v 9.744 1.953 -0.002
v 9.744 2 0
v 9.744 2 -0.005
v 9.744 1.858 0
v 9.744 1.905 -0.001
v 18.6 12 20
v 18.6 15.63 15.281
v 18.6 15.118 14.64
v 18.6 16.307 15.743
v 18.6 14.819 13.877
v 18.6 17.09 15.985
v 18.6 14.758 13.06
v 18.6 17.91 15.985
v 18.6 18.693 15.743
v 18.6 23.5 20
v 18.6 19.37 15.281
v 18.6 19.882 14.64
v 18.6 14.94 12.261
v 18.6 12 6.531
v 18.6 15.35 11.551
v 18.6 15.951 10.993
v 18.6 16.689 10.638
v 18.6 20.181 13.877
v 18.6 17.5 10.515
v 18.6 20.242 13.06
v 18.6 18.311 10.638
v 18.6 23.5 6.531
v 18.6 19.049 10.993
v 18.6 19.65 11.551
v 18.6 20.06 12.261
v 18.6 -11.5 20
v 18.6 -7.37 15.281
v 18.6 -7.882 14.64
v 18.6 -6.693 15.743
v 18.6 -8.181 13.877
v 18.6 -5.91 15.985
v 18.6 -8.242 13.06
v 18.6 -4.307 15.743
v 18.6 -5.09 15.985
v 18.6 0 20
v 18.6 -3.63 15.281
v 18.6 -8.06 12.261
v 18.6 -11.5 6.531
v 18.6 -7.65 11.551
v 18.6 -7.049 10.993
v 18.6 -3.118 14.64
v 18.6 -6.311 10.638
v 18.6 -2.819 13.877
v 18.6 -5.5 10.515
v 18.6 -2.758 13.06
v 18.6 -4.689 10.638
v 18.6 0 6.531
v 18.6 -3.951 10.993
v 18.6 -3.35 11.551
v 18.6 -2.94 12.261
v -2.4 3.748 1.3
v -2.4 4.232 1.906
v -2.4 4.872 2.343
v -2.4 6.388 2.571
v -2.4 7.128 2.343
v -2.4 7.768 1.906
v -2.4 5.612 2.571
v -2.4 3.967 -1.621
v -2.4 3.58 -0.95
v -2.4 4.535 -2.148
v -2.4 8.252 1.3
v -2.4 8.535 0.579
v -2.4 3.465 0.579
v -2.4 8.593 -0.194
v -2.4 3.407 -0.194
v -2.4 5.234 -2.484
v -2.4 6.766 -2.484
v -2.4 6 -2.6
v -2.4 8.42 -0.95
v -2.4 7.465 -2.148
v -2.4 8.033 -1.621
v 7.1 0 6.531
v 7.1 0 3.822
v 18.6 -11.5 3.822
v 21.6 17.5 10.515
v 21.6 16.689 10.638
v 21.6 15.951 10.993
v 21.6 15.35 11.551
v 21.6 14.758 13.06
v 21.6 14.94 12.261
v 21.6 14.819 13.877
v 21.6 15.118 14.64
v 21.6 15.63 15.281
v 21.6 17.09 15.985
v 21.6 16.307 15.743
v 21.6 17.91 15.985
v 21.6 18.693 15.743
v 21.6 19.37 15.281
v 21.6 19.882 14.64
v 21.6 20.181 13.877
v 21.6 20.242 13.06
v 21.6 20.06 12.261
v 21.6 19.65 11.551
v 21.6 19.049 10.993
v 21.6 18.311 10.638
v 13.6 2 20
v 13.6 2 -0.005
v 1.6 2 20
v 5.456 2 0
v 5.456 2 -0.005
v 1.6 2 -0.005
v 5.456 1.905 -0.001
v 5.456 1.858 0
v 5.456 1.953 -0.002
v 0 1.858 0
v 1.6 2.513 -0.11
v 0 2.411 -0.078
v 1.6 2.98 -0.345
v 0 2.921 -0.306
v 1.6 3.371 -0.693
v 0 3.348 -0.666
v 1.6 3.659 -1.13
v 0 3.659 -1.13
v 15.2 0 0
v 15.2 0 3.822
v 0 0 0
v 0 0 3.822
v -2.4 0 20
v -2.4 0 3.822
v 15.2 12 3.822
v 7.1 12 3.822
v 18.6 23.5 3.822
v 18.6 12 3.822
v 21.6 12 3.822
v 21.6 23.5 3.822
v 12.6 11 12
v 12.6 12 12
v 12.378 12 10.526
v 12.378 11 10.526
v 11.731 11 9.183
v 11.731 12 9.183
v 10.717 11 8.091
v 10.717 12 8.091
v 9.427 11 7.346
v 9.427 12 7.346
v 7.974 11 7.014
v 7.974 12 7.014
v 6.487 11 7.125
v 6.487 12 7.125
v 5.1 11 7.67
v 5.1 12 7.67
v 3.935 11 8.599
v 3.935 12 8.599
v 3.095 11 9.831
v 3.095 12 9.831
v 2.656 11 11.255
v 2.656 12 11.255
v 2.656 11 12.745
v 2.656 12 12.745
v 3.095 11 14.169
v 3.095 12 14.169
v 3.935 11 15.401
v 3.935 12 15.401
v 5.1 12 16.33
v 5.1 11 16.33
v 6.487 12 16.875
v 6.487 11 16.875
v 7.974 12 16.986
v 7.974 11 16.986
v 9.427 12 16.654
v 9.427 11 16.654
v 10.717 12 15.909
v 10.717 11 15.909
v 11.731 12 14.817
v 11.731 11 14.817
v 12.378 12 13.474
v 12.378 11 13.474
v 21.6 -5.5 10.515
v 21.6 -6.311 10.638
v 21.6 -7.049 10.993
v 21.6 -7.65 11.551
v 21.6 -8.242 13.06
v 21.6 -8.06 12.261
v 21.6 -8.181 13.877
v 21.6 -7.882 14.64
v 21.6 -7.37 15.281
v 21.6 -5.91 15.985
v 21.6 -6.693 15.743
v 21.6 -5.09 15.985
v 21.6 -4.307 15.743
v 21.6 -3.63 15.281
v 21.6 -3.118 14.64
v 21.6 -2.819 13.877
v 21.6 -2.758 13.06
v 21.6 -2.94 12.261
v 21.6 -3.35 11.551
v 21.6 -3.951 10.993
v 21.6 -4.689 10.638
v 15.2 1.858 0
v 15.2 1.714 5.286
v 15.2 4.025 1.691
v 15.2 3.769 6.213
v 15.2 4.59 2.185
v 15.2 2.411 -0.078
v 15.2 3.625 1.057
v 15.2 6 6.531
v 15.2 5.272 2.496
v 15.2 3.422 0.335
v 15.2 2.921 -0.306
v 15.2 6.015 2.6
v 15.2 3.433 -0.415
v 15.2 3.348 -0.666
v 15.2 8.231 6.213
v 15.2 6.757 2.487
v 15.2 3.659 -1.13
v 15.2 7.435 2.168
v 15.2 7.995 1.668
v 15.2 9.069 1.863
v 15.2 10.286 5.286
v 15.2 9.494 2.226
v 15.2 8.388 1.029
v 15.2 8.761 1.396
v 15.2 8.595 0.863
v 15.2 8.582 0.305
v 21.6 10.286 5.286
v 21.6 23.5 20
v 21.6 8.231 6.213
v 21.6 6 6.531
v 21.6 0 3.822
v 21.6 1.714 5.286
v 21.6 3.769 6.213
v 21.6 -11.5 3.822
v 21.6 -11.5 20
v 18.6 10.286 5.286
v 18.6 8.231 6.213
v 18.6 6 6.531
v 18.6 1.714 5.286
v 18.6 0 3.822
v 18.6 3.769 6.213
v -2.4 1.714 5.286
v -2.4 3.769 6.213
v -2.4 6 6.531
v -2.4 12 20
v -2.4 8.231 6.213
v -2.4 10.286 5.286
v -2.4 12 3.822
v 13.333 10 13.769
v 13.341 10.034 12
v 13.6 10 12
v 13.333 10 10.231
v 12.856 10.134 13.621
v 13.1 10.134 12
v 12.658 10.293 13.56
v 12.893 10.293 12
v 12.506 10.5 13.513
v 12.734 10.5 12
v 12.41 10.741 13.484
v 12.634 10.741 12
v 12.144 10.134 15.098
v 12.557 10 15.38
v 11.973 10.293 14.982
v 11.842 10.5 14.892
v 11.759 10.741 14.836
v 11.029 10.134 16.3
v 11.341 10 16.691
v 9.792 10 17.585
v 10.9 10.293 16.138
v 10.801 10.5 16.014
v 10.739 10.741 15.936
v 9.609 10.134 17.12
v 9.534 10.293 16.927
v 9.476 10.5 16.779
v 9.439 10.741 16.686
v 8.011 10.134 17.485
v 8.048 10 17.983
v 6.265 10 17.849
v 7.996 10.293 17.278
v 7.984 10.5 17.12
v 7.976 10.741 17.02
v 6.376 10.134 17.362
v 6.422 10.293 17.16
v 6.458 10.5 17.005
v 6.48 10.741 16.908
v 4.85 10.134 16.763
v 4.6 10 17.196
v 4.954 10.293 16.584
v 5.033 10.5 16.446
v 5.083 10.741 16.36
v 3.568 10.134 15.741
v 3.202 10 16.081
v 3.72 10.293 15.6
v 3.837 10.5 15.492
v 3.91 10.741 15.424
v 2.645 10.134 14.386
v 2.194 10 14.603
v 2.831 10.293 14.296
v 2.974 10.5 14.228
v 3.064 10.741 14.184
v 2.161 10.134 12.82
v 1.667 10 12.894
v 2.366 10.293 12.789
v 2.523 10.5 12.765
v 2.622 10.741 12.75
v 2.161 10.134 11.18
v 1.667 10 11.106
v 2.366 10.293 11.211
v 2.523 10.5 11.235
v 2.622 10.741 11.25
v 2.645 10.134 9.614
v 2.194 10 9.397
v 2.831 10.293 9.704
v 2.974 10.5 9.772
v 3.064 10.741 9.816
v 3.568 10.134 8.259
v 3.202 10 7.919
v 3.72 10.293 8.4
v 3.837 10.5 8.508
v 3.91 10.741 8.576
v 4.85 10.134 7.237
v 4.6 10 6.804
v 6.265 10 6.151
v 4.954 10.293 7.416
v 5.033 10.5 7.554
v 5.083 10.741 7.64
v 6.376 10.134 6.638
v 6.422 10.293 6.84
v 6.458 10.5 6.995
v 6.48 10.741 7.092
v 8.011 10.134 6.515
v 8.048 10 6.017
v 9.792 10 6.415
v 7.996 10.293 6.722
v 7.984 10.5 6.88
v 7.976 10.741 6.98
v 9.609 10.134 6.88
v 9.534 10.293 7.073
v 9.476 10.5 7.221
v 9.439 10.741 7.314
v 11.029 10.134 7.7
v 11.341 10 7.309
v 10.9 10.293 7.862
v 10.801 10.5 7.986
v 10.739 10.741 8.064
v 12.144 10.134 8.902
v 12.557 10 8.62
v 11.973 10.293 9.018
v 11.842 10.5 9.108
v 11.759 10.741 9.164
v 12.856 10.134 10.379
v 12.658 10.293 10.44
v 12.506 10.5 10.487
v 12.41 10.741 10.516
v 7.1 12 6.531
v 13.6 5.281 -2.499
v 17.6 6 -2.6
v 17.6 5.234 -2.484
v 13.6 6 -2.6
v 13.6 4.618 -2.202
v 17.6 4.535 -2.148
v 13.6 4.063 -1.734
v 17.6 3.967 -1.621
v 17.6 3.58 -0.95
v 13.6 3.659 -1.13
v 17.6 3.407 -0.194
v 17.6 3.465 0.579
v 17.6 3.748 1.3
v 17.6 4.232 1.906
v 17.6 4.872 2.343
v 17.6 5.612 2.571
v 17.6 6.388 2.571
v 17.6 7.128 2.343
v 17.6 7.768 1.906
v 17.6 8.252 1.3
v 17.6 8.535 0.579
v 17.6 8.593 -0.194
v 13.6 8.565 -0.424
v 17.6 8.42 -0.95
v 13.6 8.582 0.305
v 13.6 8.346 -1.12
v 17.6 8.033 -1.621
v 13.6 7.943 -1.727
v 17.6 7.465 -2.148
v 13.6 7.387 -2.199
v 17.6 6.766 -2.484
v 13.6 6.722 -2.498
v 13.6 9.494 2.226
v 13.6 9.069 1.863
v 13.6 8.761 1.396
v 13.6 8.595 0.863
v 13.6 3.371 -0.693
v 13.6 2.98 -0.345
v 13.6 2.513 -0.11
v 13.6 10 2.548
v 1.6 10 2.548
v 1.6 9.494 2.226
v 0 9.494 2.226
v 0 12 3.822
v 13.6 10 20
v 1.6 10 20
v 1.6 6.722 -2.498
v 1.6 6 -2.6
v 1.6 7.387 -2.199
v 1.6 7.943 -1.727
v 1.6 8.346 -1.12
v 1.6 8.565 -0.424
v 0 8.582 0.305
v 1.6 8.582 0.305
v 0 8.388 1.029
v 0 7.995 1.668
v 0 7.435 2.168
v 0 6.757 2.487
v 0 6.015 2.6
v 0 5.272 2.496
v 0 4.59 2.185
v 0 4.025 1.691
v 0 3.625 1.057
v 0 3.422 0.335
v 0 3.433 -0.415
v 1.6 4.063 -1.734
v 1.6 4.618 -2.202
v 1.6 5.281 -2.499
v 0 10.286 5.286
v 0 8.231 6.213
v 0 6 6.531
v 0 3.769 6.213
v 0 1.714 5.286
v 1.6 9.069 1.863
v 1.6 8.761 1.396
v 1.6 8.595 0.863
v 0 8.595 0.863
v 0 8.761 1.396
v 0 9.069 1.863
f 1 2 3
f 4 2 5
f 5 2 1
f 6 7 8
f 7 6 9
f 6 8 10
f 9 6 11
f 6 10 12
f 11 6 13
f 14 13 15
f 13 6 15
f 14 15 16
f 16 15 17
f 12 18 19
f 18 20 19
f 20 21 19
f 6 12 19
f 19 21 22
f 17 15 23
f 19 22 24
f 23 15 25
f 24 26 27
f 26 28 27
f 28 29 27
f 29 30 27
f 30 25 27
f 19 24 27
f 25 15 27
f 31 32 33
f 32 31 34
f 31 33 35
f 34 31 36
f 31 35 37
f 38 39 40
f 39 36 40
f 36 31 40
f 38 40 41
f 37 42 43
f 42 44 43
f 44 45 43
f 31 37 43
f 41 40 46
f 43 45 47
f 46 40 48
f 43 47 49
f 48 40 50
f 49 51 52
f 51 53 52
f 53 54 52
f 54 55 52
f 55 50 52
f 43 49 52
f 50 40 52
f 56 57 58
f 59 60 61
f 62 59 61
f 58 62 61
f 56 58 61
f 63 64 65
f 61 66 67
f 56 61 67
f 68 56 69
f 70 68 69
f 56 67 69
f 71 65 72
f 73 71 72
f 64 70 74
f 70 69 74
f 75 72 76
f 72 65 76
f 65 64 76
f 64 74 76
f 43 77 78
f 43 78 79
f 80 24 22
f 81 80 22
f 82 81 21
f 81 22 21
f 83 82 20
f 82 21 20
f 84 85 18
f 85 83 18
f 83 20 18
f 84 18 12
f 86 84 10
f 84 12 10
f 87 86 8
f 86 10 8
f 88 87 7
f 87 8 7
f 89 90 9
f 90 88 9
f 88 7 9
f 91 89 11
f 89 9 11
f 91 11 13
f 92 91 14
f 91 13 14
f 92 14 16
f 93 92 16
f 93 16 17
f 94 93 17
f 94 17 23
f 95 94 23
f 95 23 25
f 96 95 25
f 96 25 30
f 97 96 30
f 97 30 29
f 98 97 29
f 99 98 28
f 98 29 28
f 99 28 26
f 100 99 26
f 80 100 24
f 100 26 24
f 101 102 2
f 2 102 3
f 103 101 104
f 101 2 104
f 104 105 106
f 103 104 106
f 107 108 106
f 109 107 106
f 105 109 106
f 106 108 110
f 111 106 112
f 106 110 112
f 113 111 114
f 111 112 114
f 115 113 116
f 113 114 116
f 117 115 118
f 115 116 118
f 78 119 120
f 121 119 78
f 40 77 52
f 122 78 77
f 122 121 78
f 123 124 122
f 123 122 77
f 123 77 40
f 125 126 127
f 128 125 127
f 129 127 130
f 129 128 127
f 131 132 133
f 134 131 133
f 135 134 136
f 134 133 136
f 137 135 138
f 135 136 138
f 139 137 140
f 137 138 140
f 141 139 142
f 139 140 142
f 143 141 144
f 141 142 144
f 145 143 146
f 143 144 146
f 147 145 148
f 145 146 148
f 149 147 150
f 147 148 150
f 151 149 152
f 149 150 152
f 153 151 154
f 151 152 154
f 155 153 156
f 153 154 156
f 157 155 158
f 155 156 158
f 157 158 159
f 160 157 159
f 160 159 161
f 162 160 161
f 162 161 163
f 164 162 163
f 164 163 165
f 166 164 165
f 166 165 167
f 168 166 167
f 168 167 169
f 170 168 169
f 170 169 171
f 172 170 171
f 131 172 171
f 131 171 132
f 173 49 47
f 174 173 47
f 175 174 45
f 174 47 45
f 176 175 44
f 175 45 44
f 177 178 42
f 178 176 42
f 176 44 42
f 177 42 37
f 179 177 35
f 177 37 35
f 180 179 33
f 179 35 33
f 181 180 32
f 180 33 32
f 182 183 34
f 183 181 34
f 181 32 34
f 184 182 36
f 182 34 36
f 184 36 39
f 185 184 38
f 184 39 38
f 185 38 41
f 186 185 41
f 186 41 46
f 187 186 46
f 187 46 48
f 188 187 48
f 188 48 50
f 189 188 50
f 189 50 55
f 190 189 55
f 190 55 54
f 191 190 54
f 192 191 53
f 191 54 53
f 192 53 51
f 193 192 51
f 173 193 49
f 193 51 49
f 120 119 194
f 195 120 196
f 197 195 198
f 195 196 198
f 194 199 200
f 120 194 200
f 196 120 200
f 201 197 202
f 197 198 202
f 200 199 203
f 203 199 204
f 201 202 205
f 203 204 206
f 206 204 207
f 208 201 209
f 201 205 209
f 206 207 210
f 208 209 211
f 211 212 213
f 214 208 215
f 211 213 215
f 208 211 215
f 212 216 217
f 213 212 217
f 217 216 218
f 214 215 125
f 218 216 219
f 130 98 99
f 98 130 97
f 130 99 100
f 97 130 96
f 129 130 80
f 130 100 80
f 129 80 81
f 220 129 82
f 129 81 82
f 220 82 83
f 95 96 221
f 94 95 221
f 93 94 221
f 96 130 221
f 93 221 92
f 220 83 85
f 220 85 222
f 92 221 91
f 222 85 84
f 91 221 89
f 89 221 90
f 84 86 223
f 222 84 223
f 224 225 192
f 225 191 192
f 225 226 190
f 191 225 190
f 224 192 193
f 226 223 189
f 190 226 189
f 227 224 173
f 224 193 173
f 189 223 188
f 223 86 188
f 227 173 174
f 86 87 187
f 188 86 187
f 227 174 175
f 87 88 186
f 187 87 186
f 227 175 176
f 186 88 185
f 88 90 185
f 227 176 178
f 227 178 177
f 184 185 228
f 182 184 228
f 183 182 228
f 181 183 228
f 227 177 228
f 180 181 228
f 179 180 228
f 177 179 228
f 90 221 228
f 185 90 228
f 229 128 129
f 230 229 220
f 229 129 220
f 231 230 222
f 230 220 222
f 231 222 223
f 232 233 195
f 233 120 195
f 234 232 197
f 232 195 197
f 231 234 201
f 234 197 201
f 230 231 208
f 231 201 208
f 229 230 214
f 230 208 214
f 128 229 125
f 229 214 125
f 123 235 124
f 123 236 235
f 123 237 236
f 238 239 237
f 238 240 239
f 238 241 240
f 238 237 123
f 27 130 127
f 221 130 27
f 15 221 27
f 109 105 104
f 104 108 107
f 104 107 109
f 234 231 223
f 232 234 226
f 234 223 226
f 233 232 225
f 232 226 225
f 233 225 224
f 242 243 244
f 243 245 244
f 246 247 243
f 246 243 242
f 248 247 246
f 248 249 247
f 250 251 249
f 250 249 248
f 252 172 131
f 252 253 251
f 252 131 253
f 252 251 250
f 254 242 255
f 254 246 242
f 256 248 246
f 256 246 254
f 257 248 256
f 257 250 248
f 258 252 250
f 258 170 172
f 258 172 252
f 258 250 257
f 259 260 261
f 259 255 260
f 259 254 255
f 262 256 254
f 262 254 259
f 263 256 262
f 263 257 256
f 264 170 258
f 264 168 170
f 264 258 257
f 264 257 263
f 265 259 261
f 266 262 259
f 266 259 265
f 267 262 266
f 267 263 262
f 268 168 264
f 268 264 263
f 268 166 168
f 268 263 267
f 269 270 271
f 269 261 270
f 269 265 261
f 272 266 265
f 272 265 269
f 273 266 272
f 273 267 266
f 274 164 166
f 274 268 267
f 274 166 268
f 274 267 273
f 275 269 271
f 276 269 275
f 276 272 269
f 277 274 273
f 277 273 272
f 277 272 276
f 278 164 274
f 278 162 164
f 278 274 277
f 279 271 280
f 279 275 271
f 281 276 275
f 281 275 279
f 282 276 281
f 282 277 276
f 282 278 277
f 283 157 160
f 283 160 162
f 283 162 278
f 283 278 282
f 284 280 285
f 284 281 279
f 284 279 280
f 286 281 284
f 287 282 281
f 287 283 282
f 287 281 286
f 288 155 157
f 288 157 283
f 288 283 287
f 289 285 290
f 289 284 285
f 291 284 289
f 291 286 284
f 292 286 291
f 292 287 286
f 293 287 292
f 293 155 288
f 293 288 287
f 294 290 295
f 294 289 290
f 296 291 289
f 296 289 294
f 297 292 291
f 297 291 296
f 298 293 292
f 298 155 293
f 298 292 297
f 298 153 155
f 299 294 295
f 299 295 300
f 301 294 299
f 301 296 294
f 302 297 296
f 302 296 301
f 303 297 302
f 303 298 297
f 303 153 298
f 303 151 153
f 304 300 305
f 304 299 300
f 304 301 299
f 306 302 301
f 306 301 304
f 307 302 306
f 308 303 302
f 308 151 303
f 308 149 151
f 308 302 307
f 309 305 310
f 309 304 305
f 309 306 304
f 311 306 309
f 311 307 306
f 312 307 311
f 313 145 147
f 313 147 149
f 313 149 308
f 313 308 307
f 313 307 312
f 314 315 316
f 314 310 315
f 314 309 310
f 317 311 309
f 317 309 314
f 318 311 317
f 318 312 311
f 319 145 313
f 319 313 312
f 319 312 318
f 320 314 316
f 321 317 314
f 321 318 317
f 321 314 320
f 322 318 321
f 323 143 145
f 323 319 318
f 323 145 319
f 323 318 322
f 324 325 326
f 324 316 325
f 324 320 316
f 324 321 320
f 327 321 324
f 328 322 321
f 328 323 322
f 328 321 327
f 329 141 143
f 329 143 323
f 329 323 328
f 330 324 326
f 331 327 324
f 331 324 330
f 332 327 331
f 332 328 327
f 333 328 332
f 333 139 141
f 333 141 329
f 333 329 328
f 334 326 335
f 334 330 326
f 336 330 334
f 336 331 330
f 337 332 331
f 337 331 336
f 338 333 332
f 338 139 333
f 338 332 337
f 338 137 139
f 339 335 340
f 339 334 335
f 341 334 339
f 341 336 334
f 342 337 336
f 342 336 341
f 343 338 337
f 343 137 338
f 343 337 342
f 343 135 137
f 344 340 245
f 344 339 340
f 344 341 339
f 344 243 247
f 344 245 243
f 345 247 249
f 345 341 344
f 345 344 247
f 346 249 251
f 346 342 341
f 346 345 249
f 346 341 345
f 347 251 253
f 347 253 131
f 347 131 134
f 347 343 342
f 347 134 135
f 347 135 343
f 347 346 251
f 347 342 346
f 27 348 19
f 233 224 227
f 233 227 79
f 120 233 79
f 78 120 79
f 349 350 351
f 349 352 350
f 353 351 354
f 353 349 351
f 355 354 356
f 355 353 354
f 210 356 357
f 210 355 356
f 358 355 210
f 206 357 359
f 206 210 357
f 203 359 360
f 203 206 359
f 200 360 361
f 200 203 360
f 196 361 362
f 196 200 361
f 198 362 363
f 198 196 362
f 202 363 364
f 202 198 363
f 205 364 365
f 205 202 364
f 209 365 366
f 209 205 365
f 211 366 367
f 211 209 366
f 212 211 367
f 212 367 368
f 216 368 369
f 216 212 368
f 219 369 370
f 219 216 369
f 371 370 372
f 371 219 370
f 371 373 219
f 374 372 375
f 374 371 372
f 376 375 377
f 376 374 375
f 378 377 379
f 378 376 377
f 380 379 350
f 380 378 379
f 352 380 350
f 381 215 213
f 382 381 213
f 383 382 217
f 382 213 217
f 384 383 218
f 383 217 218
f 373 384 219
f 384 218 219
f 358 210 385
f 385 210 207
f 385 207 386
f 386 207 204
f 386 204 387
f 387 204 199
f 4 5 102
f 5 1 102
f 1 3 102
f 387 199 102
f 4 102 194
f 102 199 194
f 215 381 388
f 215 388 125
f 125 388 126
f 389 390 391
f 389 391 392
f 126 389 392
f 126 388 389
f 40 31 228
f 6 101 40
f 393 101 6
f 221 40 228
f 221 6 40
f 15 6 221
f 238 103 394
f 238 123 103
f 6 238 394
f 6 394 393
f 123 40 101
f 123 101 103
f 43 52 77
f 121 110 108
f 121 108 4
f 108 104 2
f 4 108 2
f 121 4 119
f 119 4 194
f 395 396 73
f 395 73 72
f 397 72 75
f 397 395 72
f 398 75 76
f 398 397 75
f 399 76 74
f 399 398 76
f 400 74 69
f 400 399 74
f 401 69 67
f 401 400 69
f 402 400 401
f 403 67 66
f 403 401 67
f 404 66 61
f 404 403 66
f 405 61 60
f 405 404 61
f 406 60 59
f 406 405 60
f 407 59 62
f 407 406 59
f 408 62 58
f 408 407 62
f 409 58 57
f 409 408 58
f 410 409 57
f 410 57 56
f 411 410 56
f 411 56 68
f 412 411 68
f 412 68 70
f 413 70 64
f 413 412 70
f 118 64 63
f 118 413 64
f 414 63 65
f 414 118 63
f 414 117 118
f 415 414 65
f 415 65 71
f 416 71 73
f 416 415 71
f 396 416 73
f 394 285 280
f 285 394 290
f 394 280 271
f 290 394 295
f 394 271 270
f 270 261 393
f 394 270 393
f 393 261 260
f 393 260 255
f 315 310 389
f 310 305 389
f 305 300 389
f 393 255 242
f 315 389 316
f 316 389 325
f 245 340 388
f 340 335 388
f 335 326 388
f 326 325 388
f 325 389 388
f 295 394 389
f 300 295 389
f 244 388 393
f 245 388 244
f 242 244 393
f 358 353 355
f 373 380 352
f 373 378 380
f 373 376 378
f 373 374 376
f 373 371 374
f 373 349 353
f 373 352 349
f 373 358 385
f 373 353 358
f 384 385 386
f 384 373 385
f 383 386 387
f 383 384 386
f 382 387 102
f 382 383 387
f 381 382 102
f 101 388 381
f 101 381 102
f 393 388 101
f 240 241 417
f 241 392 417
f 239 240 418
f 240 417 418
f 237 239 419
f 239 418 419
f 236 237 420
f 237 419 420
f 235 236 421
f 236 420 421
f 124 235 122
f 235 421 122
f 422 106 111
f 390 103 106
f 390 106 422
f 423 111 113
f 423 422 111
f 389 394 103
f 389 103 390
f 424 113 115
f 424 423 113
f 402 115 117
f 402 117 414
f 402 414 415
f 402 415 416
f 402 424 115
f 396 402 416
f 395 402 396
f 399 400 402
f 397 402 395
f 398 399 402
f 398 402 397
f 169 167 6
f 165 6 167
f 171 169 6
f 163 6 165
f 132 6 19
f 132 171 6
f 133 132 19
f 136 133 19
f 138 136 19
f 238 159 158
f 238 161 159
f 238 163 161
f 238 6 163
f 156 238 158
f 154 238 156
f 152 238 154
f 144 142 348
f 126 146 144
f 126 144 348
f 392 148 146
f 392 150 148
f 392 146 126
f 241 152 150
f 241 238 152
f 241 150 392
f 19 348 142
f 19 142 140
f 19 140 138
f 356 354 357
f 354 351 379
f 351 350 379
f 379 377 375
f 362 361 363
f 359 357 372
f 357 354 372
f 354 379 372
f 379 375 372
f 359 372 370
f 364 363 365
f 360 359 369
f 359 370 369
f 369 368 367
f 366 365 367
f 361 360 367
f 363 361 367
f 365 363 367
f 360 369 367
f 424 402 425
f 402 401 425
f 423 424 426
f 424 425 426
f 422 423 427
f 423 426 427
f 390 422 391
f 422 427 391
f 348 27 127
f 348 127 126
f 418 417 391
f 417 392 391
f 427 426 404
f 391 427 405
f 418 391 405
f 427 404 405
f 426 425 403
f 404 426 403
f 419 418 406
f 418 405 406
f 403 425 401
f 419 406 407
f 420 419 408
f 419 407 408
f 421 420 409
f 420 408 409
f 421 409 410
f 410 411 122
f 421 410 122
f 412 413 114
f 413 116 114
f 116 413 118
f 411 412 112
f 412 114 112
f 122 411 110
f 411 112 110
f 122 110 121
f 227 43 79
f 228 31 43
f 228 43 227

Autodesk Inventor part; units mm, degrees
ref_plane "YZ Plane" through (0, 0, 0) normal (1, 0, 0) x (0, 1, 0)
sketch "Sketch1" plane through (0, 0, 0) normal (0, 0, 1) x (1, 0, 0)
  line L0 (0, 0) -> (15.2, 0)
  line L1 (15.2, 0) -> (15.2, 12)
  line L2 (15.2, 12) -> (0, 12)
  line L3 (0, 12) -> (0, 0)
  line L4 (1.6, 10) -> (13.6, 10)
  line L5 (13.6, 10) -> (13.6, 2)
  line L6 (13.6, 2) -> (1.6, 2)
  line L7 (1.6, 2) -> (1.6, 10)
  dimension "d0" = 15.2
  dimension "d1" = 12
  dimension "d2" = 1.6
  dimension "d3" = 2
  dimension "d4" = 2
  dimension "d5" = 1.6
extrude "Extrusion1" add sketch "Sketch1" along normal blind 20
sketch "Sketch2" plane through (0, 0, 0) normal (1, 0, 0) x (0, 1, 0)
  line L0 (0, 0) -> (12, 0) construction
  line L1 (6, 13.0663) -> (6, -2.0093) construction
  line L2 (0, 0) -> (0, 20) construction
  line L3 (12, 0) -> (12, 20) construction
  line L4 (6, 0) -> (12, 3.8224)
  line L5 (12, 3.8224) -> (12, 0)
  line L6 (12, 0) -> (6, 0)
  dimension "d8" = 12
  dimension "d9" = 6
  dimension "d10" = 32.5
extrude "Extrusion2" cut sketch "Sketch2" along normal through all
sketch "Sketch4" plane through (1.6, 2, 20) normal (1, 0, 0) x (0, 0, -1)
  circle A0 centre (20, 4) radius 2.6
  point P0 (20, -2)
  dimension "d14" = 5.2
extrude "Extrusion3" add sketch "Sketch4" against normal blind 4
sketch "Sketch5" plane through (0, 0, 20) normal (-1, 0, 0) x (0, 0, 1)
  line L0 (-20, 0) -> (0, 0) construction
  line L1 (0, 12) -> (0, 0) construction
  line L2 (-16.1776, 12) -> (0, 12) construction
  arc A0 (-16.1776, 0) -> (-16.1776, 12) centre (-21.4691, 6) ccw
  line L3 (-16.1776, 12) -> (0, 12)
  line L4 (0, 0) -> (-16.1776, 0)
  line L5 (0, 0) -> (0, 12)
  dimension "d17" = 8
extrude "Extrusion4" add sketch "Sketch5" along normal blind 2.4
ref_plane "Work Plane2" through (7.6, 2, 20) normal (1, 0, 0) x (0, 0, -1)
mirror "Mirror1" about plane through (7.6, 2, 20) normal (1, 0, 0) of "Extrusion3", "Extrusion4"
fillet "Fillet1" radius 2 4 edges at (14.4, 8.1928, 1.397) (0.8, 8.1928, 1.397) (14.4, 3.4, 0) (0.8, 3.4, 0)
sketch "Sketch9" plane through (17.6, 6, -1.4691) normal (1, 0, 0) x (0, 0, -1)
  line L0 (-5.2915, -6) -> (-21.4691, -6) projected
  arc A0 (-5.2915, 6) -> (-5.2915, -6) centre (0, 0) ccw projected
  line L1 (-21.4691, 6) -> (-5.2915, 6) projected
  line L2 (-21.4691, -6) -> (-21.4691, 6) projected
  point P0 (-1.4691, -6)
extrude "Extrusion8" add sketch "Sketch9" along normal blind 1
sketch "Sketch10" plane through (18.6, 6, -1.4691) normal (1, 0, 0) x (0, 0, -1)
  arc A0 (-5.2915, 6) -> (-5.2915, -6) centre (0, 0) ccw construction
  line L0 (-21.4691, 6) -> (-21.4691, -6) construction
  line L1 (-21.4691, 17.5) -> (-8, 17.5)
  line L2 (-8, 17.5) -> (-8, -17.5)
  line L3 (-8, -17.5) -> (-21.4691, -17.5)
  line L4 (-21.4691, -17.5) -> (-21.4691, 17.5)
  line L5 (0, 0) -> (-40.6446, 0) construction
  line L6 (-5.2915, 6) -> (-21.4691, 6) construction
  circle A1 centre (-14.7345, 11.5) radius 2.75
  line L7 (-14.7345, 17.5) -> (-14.7345, -17.5) construction
  circle A2 centre (-14.7345, -11.5) radius 2.75
  dimension "d37" = 35
  dimension "d38" = 17.5
  dimension "d41" = 5.5
  dimension "d42" = 5.5
extrude "Extrusion10" add sketch "Sketch10" along normal blind 3
sketch "Sketch11" plane through (18.6, 12, 6.5309) normal (0, 0, -1) x (-1, 0, 0)
  line L0 (0, -23.5) -> (-3, -23.5) construction
  line L1 (0, -12) -> (0, -23.5) construction
  line L2 (18.6, -12) -> (3.4, -12) construction
  line L3 (-3, -12) -> (11.5, -12)
  line L4 (11.5, -12) -> (0, -23.5)
  line L5 (0, -23.5) -> (-3, -23.5)
  line L6 (-3, -12) -> (-3, -23.5)
  dimension "d47" = 45
extrude "Extrusion11" add sketch "Sketch11" along normal up to surface (2.7085 mm away)
ref_plane "Work Plane4" through (1.6, 6, 20) normal (0, 1, 0) x (1, 0, 0)
mirror "Mirror3" about plane through (1.6, 6, 20) normal (0, 1, 0) of "Extrusion11"
sketch "Sketch13" plane through (21.6, 6, -1.4691) normal (1, 0, 0) x (0, 0, -1)
  line L0 (-8, -6) -> (-5.2915, -6) projected
  line L1 (-8, -6) -> (-8, 6) projected
  line L2 (-8, 6) -> (-5.2915, 6) projected
  arc A0 (-5.2915, 6) -> (-8, 0) centre (0, 0) ccw projected
  arc A1 (-8, 0) -> (-5.2915, -6) centre (0, 0) ccw projected
  point P0 (-1.4691, -6)
extrude "Extrusion13" add sketch "Sketch13" against normal up to surface (3 mm away)
sketch "Sketch14" plane through (-2.4, 12, 3.8224) normal (0, 1, 0) x (1, 0, 0)
  line L0 (4, 1.2741) -> (4, -16.1776) construction
  line L1 (16, 1.2741) -> (16, -16.1776) construction
  line L2 (9.5, 0) -> (2.4, 0) construction
  line L3 (0, -16.1776) -> (21, -16.1776) construction
  circle A0 centre (10, -8.1776) radius 5
  dimension "d54" = 10
  dimension "d56" = 12
  dimension "d57" = 6
  dimension "d58" = 8
extrude "Extrusion14" cut sketch "Sketch14" against normal blind 3
fillet "Fillet2" radius 1 1 edges at (2.6, 10, 12)
equation "\"d9\" = 0.5 * d8"
equation "\"d38\" = 0.5 * d37"
equation "\"d57\" = 0.5 * d56"
properties part number "chain_end_2020"
